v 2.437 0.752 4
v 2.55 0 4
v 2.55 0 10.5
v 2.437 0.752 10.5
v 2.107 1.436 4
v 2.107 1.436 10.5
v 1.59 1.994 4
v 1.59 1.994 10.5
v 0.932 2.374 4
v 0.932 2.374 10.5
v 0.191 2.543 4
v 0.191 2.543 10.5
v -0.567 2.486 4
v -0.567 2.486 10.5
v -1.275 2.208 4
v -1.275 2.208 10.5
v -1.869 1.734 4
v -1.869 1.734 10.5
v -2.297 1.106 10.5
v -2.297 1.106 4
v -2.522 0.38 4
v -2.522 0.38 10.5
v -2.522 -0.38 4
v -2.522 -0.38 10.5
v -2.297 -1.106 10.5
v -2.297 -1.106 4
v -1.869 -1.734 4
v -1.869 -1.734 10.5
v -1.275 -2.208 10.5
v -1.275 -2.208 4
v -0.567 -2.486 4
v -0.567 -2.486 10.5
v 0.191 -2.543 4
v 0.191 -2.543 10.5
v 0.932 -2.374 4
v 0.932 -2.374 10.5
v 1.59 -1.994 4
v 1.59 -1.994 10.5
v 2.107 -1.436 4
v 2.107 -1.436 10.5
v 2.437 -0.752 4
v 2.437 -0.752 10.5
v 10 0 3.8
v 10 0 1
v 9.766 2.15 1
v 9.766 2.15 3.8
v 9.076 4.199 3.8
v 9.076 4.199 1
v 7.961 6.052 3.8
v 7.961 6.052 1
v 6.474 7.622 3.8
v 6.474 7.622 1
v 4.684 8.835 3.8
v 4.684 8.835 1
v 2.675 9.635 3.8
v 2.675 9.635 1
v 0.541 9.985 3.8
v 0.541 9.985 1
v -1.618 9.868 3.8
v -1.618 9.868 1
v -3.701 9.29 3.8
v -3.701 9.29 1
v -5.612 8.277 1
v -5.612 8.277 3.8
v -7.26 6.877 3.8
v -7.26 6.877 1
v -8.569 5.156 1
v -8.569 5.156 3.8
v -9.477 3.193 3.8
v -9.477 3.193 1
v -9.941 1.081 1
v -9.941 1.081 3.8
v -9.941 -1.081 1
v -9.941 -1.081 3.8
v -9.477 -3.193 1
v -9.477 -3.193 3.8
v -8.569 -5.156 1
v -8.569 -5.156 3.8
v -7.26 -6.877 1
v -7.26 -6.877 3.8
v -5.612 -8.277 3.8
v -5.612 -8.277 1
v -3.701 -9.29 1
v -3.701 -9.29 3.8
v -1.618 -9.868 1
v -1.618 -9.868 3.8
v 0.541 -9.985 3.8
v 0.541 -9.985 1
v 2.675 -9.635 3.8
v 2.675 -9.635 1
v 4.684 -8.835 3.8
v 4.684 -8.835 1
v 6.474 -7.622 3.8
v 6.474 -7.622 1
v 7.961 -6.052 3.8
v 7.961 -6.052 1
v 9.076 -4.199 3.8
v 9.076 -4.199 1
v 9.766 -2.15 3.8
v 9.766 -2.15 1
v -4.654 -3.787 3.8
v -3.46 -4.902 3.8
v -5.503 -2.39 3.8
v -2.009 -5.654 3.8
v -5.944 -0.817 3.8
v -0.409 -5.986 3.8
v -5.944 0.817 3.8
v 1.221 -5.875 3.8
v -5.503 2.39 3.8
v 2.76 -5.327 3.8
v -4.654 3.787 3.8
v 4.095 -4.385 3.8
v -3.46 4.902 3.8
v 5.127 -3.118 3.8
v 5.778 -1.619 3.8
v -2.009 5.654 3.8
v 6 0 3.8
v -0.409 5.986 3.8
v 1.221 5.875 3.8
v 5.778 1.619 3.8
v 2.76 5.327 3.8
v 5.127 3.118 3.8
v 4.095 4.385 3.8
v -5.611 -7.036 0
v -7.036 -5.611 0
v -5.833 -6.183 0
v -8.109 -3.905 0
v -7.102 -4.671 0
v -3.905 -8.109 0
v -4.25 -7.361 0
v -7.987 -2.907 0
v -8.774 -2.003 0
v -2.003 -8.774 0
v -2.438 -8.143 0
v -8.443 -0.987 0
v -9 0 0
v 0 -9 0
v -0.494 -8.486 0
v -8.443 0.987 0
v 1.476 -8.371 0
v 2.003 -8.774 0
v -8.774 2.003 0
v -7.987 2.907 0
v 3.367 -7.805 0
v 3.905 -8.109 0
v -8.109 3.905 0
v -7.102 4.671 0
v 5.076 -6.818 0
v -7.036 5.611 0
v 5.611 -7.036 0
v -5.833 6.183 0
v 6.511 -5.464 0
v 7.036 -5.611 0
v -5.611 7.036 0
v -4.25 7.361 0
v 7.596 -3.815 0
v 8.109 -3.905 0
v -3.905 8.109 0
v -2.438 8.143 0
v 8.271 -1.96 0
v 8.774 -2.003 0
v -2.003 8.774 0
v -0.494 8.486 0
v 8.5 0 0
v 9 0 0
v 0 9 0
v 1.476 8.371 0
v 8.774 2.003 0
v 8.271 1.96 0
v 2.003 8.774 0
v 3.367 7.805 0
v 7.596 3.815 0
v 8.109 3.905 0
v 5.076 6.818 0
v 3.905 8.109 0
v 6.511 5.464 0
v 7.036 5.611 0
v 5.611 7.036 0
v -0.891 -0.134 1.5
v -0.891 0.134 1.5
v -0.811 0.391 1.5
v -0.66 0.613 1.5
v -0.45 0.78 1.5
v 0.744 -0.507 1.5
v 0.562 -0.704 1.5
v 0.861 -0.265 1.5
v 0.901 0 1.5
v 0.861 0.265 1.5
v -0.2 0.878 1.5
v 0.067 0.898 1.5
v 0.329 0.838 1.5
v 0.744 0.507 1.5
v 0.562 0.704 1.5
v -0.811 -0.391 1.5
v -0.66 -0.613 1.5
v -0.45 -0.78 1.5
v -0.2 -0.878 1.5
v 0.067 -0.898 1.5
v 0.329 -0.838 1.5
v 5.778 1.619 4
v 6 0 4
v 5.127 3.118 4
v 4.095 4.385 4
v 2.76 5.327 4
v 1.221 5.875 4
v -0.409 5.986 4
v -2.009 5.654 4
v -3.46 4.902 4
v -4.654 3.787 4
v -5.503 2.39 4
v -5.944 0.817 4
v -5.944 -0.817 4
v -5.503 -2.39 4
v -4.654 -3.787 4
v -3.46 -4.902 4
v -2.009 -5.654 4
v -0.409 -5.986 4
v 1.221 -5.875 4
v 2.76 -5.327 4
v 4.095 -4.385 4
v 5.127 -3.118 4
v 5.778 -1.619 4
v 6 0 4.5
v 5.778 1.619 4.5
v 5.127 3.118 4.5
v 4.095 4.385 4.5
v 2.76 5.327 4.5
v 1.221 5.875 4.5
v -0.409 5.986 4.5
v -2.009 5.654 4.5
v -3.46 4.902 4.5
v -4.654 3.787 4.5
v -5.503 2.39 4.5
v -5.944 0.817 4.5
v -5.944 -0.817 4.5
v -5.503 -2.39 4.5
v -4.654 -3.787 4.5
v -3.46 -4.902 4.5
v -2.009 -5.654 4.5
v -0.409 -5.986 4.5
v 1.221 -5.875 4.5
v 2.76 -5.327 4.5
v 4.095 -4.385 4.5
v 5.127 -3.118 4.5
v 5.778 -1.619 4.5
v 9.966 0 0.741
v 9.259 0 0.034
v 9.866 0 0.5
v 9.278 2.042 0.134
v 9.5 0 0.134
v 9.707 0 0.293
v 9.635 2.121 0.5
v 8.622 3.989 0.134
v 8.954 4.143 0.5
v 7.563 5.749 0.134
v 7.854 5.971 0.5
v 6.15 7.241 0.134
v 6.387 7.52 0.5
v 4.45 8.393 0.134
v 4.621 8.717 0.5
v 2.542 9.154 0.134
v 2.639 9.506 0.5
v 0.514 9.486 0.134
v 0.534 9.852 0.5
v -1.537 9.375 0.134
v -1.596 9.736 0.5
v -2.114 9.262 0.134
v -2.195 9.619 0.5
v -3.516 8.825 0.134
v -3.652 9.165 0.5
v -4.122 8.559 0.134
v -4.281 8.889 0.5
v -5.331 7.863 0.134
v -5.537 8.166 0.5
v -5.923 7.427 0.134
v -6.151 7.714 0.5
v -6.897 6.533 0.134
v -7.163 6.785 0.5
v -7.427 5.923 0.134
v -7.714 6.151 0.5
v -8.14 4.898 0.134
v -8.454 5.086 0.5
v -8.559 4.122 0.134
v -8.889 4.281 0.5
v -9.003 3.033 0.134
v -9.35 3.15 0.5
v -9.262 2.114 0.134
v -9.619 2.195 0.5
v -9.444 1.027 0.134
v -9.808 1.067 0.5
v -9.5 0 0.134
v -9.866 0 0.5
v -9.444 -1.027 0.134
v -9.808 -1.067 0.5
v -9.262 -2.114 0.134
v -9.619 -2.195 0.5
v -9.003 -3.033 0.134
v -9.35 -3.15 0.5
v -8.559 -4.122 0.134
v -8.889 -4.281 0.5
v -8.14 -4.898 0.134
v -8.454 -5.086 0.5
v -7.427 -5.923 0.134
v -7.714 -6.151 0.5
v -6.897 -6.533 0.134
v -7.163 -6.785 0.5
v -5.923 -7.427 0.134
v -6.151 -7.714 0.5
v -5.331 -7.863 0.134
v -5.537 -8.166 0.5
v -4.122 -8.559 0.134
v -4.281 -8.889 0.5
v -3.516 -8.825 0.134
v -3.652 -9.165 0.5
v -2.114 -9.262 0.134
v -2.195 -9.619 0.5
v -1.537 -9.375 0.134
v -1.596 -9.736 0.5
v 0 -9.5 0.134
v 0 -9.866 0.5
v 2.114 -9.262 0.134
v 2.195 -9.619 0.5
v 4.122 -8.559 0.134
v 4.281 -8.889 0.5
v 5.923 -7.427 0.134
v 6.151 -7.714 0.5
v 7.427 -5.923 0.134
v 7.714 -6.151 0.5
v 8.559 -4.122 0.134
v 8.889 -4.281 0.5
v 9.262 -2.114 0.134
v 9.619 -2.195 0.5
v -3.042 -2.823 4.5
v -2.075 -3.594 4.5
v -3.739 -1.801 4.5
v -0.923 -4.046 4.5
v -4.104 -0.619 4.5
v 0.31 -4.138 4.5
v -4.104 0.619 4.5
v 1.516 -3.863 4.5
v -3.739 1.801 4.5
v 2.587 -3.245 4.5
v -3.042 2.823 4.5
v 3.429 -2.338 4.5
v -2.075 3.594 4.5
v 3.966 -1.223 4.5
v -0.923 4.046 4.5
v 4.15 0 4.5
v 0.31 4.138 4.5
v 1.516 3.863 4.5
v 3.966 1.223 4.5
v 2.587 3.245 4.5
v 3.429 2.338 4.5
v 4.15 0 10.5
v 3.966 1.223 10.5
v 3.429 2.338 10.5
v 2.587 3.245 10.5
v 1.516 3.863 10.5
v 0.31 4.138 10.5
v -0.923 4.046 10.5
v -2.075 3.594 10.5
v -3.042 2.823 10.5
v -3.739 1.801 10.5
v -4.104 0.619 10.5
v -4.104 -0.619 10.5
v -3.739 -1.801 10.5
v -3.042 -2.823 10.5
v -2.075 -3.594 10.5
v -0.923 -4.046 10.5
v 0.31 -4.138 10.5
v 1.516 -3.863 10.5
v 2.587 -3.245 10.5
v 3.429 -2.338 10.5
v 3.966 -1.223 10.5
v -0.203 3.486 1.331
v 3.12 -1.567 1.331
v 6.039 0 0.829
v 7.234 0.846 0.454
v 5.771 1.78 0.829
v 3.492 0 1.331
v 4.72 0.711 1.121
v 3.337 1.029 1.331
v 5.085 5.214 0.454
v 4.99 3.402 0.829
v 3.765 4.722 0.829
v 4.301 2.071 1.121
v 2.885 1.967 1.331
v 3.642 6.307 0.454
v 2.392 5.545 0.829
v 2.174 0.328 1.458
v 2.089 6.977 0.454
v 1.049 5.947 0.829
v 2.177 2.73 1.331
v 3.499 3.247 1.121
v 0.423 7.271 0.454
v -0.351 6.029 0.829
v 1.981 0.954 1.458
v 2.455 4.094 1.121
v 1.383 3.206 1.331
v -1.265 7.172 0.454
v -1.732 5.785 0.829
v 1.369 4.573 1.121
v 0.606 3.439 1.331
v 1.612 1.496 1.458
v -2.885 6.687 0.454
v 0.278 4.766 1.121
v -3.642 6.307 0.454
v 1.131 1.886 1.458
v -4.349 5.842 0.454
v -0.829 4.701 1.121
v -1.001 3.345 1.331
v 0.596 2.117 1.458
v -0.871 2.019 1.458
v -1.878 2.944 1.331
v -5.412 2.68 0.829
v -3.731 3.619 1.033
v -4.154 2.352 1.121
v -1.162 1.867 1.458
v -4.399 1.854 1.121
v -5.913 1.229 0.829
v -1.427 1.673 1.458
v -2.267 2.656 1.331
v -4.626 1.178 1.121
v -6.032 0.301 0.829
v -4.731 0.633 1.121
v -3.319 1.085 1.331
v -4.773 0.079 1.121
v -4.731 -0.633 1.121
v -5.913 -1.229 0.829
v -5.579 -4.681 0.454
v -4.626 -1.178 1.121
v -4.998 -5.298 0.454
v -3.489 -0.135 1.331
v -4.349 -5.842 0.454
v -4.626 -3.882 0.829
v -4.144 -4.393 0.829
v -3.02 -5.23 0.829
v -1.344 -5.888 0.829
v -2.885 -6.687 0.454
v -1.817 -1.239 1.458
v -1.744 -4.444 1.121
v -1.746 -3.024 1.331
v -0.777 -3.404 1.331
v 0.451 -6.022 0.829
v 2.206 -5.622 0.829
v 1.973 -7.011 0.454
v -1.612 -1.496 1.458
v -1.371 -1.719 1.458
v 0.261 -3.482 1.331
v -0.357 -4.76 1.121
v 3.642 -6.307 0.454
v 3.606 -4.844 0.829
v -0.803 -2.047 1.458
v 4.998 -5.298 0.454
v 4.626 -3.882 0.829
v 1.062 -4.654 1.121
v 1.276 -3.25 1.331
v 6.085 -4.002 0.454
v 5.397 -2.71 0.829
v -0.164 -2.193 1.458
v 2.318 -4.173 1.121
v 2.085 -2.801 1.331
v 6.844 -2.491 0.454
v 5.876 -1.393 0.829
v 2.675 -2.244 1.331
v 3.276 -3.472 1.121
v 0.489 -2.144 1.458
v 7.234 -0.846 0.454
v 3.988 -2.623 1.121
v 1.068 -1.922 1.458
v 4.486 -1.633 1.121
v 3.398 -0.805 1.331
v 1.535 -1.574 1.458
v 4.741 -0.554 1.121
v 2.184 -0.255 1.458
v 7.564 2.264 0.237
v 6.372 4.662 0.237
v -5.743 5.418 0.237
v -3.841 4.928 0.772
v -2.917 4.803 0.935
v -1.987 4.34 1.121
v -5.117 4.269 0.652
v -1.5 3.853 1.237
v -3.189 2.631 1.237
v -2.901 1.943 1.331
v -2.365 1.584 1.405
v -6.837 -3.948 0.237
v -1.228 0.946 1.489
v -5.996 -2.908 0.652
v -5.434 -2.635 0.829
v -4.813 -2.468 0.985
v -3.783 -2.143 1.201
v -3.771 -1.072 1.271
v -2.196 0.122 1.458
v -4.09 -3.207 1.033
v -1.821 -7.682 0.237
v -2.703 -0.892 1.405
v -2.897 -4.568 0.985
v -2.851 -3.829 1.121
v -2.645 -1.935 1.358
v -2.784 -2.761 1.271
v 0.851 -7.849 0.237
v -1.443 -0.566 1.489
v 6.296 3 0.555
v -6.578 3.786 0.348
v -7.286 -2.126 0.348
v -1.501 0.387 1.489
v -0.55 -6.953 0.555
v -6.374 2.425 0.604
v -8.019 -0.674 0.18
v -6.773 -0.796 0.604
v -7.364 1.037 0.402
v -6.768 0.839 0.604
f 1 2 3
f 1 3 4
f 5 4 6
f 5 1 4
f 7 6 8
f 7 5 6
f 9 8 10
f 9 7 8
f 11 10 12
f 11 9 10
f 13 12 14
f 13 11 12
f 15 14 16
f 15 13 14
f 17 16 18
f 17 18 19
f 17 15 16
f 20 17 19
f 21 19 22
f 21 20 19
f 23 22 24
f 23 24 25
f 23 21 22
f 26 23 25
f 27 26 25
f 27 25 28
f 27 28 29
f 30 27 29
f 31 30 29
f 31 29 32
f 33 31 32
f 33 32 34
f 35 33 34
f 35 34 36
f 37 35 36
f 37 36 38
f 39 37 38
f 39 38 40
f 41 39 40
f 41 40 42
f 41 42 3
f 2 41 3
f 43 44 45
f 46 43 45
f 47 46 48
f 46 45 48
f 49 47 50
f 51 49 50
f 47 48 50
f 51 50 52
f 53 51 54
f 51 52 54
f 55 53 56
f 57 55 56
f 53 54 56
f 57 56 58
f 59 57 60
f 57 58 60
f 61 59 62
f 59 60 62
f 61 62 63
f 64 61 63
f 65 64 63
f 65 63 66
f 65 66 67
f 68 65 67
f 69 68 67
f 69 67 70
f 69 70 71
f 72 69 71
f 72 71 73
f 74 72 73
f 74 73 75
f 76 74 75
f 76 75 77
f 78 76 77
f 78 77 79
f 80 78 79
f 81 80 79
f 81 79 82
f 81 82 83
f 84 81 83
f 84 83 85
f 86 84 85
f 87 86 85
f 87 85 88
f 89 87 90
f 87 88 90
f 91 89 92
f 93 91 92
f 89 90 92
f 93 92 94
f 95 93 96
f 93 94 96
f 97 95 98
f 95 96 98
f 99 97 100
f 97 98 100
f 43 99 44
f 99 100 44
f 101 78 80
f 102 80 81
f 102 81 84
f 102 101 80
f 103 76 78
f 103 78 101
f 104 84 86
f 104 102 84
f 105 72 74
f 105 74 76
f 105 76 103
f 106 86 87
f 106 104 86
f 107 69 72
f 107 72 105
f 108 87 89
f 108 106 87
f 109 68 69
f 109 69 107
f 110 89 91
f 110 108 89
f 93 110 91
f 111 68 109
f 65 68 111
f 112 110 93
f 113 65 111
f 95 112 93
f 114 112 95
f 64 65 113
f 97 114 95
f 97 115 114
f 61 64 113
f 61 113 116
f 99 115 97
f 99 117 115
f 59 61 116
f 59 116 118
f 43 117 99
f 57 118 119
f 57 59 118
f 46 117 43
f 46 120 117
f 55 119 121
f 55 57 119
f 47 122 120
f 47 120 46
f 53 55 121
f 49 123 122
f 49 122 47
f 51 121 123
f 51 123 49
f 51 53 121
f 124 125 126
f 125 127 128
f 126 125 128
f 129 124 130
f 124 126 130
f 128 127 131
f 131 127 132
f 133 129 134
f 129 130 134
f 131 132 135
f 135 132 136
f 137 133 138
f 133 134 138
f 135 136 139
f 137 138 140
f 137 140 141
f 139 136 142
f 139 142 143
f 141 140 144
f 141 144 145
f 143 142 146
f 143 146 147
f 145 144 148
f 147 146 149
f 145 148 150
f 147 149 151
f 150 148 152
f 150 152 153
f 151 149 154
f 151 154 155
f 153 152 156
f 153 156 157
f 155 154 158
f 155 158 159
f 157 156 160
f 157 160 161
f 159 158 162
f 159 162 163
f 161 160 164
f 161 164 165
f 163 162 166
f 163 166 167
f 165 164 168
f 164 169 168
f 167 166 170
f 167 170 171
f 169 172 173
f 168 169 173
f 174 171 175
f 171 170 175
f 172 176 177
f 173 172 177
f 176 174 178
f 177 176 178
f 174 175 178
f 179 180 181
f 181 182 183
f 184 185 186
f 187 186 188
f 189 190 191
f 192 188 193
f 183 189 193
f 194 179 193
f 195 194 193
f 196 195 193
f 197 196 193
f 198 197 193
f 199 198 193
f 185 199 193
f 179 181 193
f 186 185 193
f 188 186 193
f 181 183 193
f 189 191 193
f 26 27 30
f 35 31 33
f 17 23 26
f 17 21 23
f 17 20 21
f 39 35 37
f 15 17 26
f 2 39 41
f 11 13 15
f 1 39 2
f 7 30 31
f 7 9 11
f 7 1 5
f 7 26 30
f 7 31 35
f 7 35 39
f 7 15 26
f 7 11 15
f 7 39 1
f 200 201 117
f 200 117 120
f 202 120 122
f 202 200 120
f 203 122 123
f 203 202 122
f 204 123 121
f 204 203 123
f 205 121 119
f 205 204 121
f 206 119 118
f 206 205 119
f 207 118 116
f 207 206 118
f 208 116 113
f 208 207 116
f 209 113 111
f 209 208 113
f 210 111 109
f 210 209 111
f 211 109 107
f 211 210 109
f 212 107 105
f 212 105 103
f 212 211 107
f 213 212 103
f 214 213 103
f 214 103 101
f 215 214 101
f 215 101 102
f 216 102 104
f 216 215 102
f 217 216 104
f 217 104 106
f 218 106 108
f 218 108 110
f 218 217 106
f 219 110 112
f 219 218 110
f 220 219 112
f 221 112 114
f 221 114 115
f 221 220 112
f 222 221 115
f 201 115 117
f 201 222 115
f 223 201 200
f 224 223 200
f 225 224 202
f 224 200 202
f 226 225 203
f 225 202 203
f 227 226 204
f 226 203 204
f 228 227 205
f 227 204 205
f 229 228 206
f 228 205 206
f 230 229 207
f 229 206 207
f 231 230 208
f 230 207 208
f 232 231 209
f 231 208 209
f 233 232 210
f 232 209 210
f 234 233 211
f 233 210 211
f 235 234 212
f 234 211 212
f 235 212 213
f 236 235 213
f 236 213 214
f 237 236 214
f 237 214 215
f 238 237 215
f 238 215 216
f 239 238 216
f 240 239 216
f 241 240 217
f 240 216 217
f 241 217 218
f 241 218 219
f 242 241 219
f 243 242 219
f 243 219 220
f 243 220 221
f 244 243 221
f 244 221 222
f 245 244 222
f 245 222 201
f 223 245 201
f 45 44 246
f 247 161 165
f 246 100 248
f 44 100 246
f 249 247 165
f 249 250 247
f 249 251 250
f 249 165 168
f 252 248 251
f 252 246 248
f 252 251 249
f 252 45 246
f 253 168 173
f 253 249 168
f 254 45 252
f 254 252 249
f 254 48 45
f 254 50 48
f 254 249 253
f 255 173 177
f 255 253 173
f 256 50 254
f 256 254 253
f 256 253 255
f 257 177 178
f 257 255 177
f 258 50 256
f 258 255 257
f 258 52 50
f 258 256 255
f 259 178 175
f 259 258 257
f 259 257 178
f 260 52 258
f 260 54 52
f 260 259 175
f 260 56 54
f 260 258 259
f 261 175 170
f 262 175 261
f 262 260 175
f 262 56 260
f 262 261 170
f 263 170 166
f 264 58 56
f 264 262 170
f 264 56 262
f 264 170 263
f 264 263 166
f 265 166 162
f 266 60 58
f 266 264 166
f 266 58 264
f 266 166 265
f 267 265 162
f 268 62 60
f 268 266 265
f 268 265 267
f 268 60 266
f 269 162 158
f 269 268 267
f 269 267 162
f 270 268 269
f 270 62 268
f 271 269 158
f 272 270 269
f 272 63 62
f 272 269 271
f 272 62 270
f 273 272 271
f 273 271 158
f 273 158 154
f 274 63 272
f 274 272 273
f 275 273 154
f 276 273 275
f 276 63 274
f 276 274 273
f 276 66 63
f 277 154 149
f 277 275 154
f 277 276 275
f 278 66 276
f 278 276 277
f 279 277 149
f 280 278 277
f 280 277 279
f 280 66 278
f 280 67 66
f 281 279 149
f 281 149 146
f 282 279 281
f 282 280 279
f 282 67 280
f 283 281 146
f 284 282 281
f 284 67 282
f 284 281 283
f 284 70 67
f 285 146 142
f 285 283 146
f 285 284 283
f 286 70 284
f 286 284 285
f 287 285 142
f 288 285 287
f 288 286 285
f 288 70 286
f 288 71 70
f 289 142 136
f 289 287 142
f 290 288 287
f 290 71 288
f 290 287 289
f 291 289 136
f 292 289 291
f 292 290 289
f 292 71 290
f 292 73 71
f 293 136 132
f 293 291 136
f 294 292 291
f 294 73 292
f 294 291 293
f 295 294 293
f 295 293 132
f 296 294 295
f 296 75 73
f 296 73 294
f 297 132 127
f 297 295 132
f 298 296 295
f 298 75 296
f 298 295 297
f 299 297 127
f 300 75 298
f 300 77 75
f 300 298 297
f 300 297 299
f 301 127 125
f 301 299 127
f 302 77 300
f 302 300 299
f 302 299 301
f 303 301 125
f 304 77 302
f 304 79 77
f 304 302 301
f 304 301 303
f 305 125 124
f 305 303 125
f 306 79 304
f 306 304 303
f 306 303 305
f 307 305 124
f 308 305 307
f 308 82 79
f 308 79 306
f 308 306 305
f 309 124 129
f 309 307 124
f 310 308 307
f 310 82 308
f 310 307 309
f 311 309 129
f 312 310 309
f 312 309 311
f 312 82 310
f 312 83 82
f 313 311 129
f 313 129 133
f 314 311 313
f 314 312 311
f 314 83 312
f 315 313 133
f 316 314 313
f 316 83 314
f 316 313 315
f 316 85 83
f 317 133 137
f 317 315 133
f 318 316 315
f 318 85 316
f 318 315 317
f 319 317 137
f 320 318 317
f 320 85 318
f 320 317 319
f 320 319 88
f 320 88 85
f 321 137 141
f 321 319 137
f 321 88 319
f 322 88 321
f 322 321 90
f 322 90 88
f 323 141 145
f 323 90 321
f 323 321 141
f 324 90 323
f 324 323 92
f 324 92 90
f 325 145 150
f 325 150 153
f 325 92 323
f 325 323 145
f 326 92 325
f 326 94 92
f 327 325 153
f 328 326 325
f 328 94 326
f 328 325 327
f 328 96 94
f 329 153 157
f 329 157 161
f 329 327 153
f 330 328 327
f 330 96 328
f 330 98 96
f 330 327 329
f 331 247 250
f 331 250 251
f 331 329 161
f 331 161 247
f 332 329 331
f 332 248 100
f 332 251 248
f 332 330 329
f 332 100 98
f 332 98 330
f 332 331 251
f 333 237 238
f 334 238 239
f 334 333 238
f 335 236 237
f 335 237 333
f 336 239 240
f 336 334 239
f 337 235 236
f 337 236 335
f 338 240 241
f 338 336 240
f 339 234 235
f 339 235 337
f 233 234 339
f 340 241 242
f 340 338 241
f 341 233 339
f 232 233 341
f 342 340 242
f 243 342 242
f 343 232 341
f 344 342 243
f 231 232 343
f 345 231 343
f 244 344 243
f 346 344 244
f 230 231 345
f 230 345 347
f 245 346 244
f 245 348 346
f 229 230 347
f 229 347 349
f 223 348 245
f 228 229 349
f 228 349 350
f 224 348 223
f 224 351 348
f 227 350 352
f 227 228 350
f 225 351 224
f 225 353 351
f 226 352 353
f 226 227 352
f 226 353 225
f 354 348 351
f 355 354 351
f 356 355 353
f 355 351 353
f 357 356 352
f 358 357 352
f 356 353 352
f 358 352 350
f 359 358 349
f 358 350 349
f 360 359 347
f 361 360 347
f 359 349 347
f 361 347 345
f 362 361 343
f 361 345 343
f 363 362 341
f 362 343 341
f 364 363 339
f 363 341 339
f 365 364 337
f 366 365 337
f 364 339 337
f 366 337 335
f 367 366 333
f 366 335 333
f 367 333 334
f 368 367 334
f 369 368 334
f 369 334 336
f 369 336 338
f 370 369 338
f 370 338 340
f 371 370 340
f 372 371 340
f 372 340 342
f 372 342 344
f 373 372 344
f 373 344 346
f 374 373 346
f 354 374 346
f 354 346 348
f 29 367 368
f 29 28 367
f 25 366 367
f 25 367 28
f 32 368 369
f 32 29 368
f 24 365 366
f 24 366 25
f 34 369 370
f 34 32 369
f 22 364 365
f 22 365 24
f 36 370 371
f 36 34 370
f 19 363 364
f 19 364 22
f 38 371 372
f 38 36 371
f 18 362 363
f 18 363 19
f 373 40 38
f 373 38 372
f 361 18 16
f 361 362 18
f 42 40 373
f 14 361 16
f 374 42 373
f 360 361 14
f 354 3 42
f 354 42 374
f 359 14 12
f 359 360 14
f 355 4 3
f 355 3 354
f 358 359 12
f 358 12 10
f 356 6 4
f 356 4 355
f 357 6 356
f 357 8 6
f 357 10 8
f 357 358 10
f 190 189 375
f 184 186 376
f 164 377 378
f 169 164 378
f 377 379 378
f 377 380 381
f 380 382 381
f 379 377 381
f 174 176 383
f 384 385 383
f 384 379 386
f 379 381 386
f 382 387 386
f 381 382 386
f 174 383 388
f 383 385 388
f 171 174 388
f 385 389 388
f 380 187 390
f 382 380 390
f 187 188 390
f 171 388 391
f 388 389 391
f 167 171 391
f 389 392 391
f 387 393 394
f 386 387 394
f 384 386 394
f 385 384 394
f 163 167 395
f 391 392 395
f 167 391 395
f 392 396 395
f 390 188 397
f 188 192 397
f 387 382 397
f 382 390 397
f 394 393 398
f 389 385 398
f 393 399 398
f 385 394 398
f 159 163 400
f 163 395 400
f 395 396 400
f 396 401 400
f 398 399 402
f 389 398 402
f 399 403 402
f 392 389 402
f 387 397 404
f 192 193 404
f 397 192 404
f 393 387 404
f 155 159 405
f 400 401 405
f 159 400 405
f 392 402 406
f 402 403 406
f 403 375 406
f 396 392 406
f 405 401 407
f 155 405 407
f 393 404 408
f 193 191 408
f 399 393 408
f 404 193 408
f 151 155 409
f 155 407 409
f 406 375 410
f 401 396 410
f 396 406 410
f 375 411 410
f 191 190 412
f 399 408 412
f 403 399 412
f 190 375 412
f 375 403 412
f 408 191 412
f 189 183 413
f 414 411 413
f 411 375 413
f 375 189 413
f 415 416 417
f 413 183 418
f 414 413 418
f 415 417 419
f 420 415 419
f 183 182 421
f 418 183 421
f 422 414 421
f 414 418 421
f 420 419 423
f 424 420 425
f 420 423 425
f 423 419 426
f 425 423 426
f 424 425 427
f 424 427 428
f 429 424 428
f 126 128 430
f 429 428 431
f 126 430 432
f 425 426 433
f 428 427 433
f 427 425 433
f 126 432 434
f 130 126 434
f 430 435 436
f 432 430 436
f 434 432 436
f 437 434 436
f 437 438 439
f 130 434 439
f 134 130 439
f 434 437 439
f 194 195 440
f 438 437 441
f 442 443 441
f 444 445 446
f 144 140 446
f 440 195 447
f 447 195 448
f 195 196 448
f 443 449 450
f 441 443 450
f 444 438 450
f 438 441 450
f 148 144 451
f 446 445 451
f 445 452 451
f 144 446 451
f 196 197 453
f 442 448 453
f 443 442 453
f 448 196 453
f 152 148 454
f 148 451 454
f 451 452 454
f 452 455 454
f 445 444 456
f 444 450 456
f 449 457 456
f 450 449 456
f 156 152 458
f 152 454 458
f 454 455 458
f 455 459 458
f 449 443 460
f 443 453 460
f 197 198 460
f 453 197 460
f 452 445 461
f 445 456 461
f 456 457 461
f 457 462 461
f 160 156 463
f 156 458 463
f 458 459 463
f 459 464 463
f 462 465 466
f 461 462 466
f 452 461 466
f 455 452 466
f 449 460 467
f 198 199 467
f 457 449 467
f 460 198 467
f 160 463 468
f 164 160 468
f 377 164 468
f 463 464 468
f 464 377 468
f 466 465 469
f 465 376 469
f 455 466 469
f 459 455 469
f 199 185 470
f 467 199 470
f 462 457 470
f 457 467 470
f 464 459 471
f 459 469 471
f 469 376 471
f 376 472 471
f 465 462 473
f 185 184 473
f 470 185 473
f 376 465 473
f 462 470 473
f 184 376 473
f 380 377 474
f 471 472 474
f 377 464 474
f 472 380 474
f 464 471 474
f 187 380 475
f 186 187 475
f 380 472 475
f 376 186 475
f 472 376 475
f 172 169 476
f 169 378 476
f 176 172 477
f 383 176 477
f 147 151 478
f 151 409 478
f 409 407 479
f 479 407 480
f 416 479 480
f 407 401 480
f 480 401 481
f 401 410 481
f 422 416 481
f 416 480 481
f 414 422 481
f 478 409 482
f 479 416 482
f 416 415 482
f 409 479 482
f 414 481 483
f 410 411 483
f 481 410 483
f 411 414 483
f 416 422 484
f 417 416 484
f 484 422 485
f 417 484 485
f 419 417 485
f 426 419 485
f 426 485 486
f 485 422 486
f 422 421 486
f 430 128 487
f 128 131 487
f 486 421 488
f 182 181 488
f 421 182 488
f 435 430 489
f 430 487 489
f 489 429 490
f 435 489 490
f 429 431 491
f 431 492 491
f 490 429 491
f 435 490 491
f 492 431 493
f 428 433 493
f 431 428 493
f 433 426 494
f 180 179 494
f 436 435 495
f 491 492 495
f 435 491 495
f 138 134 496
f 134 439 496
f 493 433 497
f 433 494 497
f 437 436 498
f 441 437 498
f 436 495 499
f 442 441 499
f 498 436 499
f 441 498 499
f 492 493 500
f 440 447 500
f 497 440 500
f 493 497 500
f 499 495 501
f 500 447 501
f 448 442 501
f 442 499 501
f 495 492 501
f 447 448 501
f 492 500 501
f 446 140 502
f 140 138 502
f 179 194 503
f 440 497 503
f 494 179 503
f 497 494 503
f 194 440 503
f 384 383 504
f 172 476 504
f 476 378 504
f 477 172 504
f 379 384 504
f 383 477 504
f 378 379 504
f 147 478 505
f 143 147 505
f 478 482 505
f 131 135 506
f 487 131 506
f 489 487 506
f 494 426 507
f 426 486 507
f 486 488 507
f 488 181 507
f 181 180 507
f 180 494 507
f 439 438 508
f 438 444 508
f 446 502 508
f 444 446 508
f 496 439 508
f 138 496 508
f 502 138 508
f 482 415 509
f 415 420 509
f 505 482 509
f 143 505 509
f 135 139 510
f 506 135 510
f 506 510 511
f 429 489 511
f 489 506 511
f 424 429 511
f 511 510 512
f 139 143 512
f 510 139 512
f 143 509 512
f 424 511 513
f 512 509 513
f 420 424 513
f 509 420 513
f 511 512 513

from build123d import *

# Parameters (mm, degrees)
F0_R     = 10
F0_R_2   = 6
F1_DEPTH = 4
F0_R_3   = 4.15
F0_R_4   = 2.55
F2_DEPTH = 10.5
F3_DEPTH = 4.5
F4_R     = 8.5
F4_R_2   = 6
F5_DEPTH = 1.5
F7_R     = 1
F8_DEPTH = 0.2


# Not quite as in the source:
# - a fillet or chamfer that OpenCascade refuses, or shapes differently, is made with other operations: its cross-section is extruded or revolved along the edge and cut away or added
# - a feature names something its author has since deleted; it is built from what else it names


with BuildPart() as f1:
    # F0 (on Top) → F1 (new body)
    with BuildSketch(Plane.XY):
        Circle(F0_R)
        Circle(F0_R_2, mode=Mode.SUBTRACT)
    extrude(amount=F1_DEPTH)



with BuildPart() as f1b:
    # F0 (on Top) → F1, piece 2 (new body)
    with BuildSketch(Plane.XY):
        Circle(F0_R_3)
        Circle(F0_R_4, mode=Mode.SUBTRACT)
        Circle(F0_R_4)
    extrude(amount=F1_DEPTH)

    # F0 (on Top) → F2 (join)
    with BuildSketch(Plane.XY):
        Circle(F0_R_3)
        Circle(F0_R_4, mode=Mode.SUBTRACT)
    extrude(amount=F2_DEPTH)


with BuildPart() as f1_1:
    add(f1.part)

    add(f1b.part)  # F3 merges F1b
    # F0 (on Top) → F3 (join)
    with BuildSketch(Plane.XY):
        Circle(F0_R_2)
        Circle(F0_R_3, mode=Mode.SUBTRACT)
    extrude(amount=F3_DEPTH)

    # F4 (on face) → F5 (cut)
    with BuildSketch(Plane.XY):
        Circle(F4_R)
        Circle(F4_R_2, mode=Mode.SUBTRACT)
        Circle(F4_R_2)
    extrude(amount=F5_DEPTH, mode=Mode.SUBTRACT)

    # F6: fillet of radius 20 on 1 edges, made by hand

    # F6_s1 → F6_t2 (revolve)
    with BuildSketch(Plane.XZ):
        with BuildLine():
            ThreePointArc((8.5, 0), (4.7736412694, 1.1214168703), (0.9006579232, 1.5))
            Line((0.9006579232, 1.5), (8.5, 1.5))
            Line((8.5, 1.5), (8.5, 0))
        make_face()
    revolve(axis=Axis((0, 0, 1.5), (0, 0, 1)))

    # F7
    f7_edges = [f1_1.edges().sort_by_distance(p)[0] for p in [
        (-10, 0, 0),
    ]]
    fillet(f7_edges, radius=F7_R)

    # F8 (cut): a face of the model
    f8_faces = [f1_1.faces().sort_by_distance(p)[0] for p in [
        (-9.7171572875, 0, 4),
    ]]
    extrude(f8_faces, amount=-F8_DEPTH, mode=Mode.SUBTRACT)


solid = f1_1.part
